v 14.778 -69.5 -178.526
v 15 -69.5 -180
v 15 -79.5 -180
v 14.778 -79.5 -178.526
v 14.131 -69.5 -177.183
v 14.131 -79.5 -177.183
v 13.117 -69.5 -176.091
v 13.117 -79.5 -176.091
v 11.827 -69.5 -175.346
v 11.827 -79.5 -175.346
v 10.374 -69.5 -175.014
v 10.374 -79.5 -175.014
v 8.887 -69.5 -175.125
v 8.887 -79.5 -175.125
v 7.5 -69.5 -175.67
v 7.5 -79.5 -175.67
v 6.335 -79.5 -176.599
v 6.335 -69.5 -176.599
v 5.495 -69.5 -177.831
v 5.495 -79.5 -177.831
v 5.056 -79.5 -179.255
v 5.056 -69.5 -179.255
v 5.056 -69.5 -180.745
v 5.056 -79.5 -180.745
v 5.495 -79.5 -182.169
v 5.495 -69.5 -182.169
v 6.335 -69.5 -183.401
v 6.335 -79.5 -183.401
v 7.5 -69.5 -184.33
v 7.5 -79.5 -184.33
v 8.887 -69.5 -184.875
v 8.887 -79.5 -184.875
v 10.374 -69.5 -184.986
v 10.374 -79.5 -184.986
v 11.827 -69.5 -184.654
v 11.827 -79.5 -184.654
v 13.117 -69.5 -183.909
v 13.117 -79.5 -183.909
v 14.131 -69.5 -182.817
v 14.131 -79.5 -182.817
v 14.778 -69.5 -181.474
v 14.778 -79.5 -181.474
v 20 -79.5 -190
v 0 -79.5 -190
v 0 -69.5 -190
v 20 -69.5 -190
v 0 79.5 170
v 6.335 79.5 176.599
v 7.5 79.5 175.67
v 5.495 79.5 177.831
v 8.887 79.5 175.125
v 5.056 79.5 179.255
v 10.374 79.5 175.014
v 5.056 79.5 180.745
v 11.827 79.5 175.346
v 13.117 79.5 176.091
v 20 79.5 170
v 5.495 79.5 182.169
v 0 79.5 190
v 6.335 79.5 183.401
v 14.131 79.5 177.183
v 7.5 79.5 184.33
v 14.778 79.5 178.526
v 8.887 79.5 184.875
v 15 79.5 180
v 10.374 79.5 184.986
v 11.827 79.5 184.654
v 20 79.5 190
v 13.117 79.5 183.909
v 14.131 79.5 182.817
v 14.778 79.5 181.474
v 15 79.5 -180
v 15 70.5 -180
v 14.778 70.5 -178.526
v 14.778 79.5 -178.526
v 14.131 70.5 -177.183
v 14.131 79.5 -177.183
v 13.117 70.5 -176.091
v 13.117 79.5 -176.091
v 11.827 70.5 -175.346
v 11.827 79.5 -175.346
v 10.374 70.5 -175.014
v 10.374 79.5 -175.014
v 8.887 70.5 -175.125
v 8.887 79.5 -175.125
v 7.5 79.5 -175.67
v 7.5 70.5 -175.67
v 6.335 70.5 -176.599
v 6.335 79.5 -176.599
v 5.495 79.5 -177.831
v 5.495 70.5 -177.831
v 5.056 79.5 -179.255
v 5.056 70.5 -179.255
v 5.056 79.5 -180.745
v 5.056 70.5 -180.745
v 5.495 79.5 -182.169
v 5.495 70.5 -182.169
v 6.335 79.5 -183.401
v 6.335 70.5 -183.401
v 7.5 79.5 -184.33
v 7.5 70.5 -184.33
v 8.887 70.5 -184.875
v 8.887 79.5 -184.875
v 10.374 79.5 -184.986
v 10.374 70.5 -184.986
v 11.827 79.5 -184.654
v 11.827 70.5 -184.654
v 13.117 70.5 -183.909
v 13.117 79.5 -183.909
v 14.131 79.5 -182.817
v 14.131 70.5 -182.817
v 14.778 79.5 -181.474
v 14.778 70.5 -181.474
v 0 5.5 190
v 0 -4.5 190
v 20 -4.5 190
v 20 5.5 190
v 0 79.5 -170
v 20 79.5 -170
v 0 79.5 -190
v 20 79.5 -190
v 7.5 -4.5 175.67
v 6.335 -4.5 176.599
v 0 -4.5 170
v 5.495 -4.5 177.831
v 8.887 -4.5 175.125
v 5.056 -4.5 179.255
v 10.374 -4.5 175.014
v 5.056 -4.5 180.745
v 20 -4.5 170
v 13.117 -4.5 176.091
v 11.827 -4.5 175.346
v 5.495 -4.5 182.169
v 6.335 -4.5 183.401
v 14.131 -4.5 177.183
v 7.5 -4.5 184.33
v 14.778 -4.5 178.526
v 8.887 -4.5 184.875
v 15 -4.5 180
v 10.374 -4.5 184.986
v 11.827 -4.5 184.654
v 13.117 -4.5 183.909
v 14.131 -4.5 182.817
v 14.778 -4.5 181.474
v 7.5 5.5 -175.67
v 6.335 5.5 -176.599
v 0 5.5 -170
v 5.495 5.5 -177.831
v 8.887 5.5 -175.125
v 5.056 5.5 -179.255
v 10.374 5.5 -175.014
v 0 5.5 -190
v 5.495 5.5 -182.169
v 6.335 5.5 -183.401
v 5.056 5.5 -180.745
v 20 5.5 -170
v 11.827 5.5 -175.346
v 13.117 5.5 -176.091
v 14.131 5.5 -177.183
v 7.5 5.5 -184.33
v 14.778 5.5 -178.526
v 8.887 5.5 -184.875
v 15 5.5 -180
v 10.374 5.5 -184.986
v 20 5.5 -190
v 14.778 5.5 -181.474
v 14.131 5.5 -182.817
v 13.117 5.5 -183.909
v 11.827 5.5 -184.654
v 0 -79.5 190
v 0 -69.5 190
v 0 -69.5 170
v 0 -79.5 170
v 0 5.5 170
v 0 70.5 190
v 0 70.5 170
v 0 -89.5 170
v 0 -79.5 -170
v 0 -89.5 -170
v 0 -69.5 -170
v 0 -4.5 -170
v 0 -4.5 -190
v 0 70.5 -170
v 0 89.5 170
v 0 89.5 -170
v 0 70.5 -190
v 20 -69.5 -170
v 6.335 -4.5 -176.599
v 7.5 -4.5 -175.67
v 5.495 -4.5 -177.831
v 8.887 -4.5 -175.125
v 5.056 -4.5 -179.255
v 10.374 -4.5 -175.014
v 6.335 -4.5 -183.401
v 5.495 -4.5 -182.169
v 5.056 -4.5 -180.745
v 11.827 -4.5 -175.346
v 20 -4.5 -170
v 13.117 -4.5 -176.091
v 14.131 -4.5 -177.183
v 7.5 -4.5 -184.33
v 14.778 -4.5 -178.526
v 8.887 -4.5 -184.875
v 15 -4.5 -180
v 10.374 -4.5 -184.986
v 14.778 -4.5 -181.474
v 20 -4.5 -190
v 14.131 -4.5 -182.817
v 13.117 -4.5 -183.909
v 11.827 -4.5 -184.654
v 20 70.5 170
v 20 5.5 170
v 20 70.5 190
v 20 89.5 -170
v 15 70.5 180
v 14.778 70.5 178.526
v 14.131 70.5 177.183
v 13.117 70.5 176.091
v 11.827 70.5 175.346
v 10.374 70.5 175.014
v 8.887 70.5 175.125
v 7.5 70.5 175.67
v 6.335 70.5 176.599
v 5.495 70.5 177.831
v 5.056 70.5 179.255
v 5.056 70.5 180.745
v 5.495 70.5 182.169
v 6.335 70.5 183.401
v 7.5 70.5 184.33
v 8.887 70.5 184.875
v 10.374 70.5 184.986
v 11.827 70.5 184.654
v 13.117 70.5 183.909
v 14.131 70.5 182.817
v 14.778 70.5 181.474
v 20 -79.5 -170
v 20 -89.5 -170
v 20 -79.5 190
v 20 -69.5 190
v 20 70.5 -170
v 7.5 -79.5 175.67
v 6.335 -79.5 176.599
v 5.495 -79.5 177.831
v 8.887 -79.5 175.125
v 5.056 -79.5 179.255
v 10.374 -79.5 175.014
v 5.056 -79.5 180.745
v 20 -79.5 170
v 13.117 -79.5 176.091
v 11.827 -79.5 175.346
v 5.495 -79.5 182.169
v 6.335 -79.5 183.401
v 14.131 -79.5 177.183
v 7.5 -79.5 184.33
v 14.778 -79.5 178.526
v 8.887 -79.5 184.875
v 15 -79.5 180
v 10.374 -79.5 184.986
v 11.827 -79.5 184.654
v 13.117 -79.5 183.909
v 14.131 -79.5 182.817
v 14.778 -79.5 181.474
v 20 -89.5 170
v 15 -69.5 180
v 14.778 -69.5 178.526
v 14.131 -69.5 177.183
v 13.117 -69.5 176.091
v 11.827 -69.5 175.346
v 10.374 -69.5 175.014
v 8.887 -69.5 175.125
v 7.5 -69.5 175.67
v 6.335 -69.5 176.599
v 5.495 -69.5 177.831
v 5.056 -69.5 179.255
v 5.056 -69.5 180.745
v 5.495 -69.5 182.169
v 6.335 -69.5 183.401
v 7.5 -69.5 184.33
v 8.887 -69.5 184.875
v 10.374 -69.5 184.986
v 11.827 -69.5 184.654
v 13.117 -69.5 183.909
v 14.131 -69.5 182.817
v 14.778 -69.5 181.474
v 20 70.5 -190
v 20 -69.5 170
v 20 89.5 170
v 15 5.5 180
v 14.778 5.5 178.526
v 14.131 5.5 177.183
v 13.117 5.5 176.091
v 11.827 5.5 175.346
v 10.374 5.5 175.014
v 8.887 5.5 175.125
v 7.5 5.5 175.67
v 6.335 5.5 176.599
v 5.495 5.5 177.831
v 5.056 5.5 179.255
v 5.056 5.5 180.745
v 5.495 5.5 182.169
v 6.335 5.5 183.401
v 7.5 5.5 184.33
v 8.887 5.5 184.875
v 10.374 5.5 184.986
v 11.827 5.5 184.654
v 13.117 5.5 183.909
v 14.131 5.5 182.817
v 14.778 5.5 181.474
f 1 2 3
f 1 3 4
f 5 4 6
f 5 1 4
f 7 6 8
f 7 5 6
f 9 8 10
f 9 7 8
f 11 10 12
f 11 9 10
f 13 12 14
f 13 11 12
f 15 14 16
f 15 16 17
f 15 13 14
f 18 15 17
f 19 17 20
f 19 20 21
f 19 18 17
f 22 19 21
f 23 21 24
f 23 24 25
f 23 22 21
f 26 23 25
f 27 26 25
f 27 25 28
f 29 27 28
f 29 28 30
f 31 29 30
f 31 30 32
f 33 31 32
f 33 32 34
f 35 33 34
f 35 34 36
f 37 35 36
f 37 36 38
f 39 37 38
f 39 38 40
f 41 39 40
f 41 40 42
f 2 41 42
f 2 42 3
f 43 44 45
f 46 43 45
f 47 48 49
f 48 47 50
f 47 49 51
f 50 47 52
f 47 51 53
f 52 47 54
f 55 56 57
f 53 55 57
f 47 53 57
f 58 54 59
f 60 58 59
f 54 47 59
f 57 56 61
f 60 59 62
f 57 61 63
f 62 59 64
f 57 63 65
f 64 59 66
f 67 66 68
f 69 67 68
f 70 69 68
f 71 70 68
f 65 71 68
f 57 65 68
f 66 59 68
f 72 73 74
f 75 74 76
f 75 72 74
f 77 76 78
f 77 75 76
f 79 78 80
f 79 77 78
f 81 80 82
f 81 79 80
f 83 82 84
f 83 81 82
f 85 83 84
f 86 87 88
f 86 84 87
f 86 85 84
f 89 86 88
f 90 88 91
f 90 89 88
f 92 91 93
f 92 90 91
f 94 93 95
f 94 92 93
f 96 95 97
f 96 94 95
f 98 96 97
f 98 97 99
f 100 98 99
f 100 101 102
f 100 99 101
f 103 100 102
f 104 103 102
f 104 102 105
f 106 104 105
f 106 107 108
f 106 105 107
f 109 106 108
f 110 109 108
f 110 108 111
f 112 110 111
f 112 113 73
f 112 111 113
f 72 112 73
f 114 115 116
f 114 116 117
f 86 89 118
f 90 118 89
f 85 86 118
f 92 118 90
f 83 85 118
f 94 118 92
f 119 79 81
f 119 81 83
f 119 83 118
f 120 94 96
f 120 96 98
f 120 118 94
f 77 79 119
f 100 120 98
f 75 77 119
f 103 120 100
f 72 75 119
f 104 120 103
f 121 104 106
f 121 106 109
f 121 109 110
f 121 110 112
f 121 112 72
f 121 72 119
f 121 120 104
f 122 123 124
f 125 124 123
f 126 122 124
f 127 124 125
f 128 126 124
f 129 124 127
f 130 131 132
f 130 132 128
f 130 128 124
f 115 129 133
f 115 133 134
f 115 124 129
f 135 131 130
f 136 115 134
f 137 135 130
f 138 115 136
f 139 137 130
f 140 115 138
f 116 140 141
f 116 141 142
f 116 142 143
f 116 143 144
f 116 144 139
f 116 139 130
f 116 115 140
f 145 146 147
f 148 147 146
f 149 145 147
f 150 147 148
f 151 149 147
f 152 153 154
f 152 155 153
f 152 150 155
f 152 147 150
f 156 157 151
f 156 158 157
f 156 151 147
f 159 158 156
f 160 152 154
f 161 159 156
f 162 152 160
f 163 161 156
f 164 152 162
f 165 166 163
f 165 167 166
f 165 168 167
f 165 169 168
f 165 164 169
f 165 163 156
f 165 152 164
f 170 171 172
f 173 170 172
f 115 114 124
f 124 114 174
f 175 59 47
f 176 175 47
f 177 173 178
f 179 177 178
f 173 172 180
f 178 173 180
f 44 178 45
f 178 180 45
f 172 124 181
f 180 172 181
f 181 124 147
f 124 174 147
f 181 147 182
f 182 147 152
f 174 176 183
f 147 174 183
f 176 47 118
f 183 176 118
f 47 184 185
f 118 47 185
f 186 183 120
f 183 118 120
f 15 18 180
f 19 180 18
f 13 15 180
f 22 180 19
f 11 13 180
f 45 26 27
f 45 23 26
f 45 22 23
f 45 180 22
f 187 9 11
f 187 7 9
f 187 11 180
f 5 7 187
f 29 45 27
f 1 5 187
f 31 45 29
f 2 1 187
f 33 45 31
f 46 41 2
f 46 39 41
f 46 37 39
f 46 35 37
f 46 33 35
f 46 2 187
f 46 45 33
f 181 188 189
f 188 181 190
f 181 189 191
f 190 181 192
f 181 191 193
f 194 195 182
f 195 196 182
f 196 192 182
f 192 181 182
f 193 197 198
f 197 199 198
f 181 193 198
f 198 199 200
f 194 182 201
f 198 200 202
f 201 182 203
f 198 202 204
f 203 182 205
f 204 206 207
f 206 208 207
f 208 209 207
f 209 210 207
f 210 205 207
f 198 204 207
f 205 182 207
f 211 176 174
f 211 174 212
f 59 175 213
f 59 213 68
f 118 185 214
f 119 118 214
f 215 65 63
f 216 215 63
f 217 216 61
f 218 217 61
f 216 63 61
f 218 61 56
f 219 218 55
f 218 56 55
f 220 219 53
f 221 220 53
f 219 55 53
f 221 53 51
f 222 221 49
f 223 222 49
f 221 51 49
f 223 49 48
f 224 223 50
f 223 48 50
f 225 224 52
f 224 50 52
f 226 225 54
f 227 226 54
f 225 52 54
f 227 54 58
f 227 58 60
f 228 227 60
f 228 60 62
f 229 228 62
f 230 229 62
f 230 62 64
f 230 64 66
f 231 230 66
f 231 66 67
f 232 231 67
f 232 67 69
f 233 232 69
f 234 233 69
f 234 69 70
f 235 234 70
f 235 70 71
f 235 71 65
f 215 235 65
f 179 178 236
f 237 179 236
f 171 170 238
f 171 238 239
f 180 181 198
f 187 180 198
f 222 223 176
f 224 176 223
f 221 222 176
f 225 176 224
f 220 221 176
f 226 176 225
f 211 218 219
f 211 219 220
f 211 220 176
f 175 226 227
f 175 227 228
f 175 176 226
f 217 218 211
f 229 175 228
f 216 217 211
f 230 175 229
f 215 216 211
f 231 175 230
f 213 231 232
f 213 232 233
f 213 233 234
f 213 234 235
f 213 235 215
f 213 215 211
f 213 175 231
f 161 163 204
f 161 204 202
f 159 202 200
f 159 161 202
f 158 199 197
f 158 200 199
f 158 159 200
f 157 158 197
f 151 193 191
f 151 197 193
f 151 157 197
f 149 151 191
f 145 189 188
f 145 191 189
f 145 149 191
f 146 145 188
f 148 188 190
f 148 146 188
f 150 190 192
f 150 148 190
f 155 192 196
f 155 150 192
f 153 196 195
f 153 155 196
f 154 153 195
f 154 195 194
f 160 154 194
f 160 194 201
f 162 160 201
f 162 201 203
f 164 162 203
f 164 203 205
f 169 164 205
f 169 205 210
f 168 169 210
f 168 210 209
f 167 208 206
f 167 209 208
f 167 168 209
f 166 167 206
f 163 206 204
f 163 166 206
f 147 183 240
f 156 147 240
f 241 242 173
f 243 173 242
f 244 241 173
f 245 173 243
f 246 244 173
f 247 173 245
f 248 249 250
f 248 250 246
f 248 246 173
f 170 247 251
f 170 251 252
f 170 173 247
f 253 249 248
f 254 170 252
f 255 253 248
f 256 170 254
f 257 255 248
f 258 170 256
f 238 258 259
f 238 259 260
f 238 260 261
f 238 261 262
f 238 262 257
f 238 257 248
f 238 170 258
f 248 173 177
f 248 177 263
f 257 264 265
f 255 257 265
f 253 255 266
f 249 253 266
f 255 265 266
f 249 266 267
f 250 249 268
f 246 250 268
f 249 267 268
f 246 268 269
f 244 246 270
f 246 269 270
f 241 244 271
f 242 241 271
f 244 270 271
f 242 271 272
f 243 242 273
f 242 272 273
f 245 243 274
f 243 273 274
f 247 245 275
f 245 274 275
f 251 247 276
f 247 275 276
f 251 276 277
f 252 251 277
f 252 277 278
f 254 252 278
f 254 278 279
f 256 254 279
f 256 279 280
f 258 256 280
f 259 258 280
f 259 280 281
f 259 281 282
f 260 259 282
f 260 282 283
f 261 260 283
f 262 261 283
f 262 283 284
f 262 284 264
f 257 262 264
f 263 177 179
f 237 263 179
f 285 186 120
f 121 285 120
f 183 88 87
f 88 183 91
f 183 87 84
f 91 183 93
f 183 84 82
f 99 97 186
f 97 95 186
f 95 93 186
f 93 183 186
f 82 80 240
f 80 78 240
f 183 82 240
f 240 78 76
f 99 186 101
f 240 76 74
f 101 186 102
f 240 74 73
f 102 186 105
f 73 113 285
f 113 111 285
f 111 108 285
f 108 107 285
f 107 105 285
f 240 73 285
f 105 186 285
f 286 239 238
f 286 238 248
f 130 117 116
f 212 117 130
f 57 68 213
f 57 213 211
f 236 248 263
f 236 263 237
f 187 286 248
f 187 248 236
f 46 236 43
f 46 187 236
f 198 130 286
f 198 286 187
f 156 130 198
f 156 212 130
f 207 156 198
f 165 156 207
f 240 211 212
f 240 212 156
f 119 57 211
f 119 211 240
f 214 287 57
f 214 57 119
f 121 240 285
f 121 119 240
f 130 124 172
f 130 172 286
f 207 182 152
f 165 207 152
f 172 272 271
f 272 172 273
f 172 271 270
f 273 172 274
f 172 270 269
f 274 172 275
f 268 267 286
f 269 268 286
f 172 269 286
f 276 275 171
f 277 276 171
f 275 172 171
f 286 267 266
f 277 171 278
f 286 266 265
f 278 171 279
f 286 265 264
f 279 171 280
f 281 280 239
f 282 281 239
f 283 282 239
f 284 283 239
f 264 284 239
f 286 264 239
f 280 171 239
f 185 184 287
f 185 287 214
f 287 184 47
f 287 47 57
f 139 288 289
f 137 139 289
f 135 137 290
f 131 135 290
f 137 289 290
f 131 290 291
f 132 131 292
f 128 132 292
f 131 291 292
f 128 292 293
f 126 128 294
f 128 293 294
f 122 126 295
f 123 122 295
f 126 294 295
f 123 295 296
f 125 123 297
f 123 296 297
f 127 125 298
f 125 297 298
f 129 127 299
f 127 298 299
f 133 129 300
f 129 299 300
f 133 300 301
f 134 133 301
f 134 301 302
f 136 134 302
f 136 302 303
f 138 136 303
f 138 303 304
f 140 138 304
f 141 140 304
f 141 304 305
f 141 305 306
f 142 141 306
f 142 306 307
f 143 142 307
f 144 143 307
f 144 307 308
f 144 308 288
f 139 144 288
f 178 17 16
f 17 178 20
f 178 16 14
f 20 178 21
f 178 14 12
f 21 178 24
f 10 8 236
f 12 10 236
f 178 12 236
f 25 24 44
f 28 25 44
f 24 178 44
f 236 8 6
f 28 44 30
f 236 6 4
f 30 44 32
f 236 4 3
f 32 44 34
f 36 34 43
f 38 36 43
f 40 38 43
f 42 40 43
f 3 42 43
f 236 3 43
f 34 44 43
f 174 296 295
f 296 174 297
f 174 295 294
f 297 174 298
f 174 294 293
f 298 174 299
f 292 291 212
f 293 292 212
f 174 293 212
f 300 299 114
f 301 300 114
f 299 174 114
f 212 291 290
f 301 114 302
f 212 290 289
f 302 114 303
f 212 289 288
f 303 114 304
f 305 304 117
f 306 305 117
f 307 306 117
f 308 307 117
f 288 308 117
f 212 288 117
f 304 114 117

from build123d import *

# Parameters (mm, degrees)
SKETCH1_W           = 380
SKETCH1_H           = 179
BOSS_EXTRUDE1_DEPTH = 20
SKETCH2_W           = 20
SKETCH2_H           = 65
SKETCH2_H_2         = 10
CUT_EXTRUDE1_DEPTH  = 20
SKETCH3_R           = 5
CUT_EXTRUDE2_DEPTH  = 159


with BuildPart() as part:
    # Sketch1 → Boss-Extrude1 (new body)
    with BuildSketch(Plane(origin=(0, 0, 0), x_dir=(0, 0, -1), z_dir=(1, 0, 0))):
        Rectangle(SKETCH1_W, SKETCH1_H)
    extrude(amount=BOSS_EXTRUDE1_DEPTH)

    # Sketch2 → Cut-Extrude1 (cut)
    with BuildSketch(Plane.XY.offset(190)):
        with Locations((10, 38)):
            Rectangle(SKETCH2_W, SKETCH2_H)
        with Locations((10, 84.5)):
            Rectangle(SKETCH2_W, SKETCH2_H_2)
        with Locations((10, -84.5)):
            Rectangle(SKETCH2_W, SKETCH2_H_2)
        with Locations((10, -37)):
            Rectangle(SKETCH2_W, SKETCH2_H)
    cut_extrude1 = extrude(amount=-CUT_EXTRUDE1_DEPTH, mode=Mode.SUBTRACT)

    # Sketch3 → Cut-Extrude2 (cut)
    with BuildSketch(Plane(origin=(0, 79.5, 0), x_dir=(1, 0, 0), z_dir=(0, 1, 0))):
        with Locations((10, -180)):
            Circle(SKETCH3_R)
    cut_extrude2 = extrude(amount=-CUT_EXTRUDE2_DEPTH, mode=Mode.SUBTRACT)

    # Mirror2: Cut-Extrude1, Cut-Extrude2 across plane
    add(cut_extrude1.mirror(Plane.XY), mode=Mode.SUBTRACT)
    add(cut_extrude2.mirror(Plane.XY), mode=Mode.SUBTRACT)


solid = part.part
